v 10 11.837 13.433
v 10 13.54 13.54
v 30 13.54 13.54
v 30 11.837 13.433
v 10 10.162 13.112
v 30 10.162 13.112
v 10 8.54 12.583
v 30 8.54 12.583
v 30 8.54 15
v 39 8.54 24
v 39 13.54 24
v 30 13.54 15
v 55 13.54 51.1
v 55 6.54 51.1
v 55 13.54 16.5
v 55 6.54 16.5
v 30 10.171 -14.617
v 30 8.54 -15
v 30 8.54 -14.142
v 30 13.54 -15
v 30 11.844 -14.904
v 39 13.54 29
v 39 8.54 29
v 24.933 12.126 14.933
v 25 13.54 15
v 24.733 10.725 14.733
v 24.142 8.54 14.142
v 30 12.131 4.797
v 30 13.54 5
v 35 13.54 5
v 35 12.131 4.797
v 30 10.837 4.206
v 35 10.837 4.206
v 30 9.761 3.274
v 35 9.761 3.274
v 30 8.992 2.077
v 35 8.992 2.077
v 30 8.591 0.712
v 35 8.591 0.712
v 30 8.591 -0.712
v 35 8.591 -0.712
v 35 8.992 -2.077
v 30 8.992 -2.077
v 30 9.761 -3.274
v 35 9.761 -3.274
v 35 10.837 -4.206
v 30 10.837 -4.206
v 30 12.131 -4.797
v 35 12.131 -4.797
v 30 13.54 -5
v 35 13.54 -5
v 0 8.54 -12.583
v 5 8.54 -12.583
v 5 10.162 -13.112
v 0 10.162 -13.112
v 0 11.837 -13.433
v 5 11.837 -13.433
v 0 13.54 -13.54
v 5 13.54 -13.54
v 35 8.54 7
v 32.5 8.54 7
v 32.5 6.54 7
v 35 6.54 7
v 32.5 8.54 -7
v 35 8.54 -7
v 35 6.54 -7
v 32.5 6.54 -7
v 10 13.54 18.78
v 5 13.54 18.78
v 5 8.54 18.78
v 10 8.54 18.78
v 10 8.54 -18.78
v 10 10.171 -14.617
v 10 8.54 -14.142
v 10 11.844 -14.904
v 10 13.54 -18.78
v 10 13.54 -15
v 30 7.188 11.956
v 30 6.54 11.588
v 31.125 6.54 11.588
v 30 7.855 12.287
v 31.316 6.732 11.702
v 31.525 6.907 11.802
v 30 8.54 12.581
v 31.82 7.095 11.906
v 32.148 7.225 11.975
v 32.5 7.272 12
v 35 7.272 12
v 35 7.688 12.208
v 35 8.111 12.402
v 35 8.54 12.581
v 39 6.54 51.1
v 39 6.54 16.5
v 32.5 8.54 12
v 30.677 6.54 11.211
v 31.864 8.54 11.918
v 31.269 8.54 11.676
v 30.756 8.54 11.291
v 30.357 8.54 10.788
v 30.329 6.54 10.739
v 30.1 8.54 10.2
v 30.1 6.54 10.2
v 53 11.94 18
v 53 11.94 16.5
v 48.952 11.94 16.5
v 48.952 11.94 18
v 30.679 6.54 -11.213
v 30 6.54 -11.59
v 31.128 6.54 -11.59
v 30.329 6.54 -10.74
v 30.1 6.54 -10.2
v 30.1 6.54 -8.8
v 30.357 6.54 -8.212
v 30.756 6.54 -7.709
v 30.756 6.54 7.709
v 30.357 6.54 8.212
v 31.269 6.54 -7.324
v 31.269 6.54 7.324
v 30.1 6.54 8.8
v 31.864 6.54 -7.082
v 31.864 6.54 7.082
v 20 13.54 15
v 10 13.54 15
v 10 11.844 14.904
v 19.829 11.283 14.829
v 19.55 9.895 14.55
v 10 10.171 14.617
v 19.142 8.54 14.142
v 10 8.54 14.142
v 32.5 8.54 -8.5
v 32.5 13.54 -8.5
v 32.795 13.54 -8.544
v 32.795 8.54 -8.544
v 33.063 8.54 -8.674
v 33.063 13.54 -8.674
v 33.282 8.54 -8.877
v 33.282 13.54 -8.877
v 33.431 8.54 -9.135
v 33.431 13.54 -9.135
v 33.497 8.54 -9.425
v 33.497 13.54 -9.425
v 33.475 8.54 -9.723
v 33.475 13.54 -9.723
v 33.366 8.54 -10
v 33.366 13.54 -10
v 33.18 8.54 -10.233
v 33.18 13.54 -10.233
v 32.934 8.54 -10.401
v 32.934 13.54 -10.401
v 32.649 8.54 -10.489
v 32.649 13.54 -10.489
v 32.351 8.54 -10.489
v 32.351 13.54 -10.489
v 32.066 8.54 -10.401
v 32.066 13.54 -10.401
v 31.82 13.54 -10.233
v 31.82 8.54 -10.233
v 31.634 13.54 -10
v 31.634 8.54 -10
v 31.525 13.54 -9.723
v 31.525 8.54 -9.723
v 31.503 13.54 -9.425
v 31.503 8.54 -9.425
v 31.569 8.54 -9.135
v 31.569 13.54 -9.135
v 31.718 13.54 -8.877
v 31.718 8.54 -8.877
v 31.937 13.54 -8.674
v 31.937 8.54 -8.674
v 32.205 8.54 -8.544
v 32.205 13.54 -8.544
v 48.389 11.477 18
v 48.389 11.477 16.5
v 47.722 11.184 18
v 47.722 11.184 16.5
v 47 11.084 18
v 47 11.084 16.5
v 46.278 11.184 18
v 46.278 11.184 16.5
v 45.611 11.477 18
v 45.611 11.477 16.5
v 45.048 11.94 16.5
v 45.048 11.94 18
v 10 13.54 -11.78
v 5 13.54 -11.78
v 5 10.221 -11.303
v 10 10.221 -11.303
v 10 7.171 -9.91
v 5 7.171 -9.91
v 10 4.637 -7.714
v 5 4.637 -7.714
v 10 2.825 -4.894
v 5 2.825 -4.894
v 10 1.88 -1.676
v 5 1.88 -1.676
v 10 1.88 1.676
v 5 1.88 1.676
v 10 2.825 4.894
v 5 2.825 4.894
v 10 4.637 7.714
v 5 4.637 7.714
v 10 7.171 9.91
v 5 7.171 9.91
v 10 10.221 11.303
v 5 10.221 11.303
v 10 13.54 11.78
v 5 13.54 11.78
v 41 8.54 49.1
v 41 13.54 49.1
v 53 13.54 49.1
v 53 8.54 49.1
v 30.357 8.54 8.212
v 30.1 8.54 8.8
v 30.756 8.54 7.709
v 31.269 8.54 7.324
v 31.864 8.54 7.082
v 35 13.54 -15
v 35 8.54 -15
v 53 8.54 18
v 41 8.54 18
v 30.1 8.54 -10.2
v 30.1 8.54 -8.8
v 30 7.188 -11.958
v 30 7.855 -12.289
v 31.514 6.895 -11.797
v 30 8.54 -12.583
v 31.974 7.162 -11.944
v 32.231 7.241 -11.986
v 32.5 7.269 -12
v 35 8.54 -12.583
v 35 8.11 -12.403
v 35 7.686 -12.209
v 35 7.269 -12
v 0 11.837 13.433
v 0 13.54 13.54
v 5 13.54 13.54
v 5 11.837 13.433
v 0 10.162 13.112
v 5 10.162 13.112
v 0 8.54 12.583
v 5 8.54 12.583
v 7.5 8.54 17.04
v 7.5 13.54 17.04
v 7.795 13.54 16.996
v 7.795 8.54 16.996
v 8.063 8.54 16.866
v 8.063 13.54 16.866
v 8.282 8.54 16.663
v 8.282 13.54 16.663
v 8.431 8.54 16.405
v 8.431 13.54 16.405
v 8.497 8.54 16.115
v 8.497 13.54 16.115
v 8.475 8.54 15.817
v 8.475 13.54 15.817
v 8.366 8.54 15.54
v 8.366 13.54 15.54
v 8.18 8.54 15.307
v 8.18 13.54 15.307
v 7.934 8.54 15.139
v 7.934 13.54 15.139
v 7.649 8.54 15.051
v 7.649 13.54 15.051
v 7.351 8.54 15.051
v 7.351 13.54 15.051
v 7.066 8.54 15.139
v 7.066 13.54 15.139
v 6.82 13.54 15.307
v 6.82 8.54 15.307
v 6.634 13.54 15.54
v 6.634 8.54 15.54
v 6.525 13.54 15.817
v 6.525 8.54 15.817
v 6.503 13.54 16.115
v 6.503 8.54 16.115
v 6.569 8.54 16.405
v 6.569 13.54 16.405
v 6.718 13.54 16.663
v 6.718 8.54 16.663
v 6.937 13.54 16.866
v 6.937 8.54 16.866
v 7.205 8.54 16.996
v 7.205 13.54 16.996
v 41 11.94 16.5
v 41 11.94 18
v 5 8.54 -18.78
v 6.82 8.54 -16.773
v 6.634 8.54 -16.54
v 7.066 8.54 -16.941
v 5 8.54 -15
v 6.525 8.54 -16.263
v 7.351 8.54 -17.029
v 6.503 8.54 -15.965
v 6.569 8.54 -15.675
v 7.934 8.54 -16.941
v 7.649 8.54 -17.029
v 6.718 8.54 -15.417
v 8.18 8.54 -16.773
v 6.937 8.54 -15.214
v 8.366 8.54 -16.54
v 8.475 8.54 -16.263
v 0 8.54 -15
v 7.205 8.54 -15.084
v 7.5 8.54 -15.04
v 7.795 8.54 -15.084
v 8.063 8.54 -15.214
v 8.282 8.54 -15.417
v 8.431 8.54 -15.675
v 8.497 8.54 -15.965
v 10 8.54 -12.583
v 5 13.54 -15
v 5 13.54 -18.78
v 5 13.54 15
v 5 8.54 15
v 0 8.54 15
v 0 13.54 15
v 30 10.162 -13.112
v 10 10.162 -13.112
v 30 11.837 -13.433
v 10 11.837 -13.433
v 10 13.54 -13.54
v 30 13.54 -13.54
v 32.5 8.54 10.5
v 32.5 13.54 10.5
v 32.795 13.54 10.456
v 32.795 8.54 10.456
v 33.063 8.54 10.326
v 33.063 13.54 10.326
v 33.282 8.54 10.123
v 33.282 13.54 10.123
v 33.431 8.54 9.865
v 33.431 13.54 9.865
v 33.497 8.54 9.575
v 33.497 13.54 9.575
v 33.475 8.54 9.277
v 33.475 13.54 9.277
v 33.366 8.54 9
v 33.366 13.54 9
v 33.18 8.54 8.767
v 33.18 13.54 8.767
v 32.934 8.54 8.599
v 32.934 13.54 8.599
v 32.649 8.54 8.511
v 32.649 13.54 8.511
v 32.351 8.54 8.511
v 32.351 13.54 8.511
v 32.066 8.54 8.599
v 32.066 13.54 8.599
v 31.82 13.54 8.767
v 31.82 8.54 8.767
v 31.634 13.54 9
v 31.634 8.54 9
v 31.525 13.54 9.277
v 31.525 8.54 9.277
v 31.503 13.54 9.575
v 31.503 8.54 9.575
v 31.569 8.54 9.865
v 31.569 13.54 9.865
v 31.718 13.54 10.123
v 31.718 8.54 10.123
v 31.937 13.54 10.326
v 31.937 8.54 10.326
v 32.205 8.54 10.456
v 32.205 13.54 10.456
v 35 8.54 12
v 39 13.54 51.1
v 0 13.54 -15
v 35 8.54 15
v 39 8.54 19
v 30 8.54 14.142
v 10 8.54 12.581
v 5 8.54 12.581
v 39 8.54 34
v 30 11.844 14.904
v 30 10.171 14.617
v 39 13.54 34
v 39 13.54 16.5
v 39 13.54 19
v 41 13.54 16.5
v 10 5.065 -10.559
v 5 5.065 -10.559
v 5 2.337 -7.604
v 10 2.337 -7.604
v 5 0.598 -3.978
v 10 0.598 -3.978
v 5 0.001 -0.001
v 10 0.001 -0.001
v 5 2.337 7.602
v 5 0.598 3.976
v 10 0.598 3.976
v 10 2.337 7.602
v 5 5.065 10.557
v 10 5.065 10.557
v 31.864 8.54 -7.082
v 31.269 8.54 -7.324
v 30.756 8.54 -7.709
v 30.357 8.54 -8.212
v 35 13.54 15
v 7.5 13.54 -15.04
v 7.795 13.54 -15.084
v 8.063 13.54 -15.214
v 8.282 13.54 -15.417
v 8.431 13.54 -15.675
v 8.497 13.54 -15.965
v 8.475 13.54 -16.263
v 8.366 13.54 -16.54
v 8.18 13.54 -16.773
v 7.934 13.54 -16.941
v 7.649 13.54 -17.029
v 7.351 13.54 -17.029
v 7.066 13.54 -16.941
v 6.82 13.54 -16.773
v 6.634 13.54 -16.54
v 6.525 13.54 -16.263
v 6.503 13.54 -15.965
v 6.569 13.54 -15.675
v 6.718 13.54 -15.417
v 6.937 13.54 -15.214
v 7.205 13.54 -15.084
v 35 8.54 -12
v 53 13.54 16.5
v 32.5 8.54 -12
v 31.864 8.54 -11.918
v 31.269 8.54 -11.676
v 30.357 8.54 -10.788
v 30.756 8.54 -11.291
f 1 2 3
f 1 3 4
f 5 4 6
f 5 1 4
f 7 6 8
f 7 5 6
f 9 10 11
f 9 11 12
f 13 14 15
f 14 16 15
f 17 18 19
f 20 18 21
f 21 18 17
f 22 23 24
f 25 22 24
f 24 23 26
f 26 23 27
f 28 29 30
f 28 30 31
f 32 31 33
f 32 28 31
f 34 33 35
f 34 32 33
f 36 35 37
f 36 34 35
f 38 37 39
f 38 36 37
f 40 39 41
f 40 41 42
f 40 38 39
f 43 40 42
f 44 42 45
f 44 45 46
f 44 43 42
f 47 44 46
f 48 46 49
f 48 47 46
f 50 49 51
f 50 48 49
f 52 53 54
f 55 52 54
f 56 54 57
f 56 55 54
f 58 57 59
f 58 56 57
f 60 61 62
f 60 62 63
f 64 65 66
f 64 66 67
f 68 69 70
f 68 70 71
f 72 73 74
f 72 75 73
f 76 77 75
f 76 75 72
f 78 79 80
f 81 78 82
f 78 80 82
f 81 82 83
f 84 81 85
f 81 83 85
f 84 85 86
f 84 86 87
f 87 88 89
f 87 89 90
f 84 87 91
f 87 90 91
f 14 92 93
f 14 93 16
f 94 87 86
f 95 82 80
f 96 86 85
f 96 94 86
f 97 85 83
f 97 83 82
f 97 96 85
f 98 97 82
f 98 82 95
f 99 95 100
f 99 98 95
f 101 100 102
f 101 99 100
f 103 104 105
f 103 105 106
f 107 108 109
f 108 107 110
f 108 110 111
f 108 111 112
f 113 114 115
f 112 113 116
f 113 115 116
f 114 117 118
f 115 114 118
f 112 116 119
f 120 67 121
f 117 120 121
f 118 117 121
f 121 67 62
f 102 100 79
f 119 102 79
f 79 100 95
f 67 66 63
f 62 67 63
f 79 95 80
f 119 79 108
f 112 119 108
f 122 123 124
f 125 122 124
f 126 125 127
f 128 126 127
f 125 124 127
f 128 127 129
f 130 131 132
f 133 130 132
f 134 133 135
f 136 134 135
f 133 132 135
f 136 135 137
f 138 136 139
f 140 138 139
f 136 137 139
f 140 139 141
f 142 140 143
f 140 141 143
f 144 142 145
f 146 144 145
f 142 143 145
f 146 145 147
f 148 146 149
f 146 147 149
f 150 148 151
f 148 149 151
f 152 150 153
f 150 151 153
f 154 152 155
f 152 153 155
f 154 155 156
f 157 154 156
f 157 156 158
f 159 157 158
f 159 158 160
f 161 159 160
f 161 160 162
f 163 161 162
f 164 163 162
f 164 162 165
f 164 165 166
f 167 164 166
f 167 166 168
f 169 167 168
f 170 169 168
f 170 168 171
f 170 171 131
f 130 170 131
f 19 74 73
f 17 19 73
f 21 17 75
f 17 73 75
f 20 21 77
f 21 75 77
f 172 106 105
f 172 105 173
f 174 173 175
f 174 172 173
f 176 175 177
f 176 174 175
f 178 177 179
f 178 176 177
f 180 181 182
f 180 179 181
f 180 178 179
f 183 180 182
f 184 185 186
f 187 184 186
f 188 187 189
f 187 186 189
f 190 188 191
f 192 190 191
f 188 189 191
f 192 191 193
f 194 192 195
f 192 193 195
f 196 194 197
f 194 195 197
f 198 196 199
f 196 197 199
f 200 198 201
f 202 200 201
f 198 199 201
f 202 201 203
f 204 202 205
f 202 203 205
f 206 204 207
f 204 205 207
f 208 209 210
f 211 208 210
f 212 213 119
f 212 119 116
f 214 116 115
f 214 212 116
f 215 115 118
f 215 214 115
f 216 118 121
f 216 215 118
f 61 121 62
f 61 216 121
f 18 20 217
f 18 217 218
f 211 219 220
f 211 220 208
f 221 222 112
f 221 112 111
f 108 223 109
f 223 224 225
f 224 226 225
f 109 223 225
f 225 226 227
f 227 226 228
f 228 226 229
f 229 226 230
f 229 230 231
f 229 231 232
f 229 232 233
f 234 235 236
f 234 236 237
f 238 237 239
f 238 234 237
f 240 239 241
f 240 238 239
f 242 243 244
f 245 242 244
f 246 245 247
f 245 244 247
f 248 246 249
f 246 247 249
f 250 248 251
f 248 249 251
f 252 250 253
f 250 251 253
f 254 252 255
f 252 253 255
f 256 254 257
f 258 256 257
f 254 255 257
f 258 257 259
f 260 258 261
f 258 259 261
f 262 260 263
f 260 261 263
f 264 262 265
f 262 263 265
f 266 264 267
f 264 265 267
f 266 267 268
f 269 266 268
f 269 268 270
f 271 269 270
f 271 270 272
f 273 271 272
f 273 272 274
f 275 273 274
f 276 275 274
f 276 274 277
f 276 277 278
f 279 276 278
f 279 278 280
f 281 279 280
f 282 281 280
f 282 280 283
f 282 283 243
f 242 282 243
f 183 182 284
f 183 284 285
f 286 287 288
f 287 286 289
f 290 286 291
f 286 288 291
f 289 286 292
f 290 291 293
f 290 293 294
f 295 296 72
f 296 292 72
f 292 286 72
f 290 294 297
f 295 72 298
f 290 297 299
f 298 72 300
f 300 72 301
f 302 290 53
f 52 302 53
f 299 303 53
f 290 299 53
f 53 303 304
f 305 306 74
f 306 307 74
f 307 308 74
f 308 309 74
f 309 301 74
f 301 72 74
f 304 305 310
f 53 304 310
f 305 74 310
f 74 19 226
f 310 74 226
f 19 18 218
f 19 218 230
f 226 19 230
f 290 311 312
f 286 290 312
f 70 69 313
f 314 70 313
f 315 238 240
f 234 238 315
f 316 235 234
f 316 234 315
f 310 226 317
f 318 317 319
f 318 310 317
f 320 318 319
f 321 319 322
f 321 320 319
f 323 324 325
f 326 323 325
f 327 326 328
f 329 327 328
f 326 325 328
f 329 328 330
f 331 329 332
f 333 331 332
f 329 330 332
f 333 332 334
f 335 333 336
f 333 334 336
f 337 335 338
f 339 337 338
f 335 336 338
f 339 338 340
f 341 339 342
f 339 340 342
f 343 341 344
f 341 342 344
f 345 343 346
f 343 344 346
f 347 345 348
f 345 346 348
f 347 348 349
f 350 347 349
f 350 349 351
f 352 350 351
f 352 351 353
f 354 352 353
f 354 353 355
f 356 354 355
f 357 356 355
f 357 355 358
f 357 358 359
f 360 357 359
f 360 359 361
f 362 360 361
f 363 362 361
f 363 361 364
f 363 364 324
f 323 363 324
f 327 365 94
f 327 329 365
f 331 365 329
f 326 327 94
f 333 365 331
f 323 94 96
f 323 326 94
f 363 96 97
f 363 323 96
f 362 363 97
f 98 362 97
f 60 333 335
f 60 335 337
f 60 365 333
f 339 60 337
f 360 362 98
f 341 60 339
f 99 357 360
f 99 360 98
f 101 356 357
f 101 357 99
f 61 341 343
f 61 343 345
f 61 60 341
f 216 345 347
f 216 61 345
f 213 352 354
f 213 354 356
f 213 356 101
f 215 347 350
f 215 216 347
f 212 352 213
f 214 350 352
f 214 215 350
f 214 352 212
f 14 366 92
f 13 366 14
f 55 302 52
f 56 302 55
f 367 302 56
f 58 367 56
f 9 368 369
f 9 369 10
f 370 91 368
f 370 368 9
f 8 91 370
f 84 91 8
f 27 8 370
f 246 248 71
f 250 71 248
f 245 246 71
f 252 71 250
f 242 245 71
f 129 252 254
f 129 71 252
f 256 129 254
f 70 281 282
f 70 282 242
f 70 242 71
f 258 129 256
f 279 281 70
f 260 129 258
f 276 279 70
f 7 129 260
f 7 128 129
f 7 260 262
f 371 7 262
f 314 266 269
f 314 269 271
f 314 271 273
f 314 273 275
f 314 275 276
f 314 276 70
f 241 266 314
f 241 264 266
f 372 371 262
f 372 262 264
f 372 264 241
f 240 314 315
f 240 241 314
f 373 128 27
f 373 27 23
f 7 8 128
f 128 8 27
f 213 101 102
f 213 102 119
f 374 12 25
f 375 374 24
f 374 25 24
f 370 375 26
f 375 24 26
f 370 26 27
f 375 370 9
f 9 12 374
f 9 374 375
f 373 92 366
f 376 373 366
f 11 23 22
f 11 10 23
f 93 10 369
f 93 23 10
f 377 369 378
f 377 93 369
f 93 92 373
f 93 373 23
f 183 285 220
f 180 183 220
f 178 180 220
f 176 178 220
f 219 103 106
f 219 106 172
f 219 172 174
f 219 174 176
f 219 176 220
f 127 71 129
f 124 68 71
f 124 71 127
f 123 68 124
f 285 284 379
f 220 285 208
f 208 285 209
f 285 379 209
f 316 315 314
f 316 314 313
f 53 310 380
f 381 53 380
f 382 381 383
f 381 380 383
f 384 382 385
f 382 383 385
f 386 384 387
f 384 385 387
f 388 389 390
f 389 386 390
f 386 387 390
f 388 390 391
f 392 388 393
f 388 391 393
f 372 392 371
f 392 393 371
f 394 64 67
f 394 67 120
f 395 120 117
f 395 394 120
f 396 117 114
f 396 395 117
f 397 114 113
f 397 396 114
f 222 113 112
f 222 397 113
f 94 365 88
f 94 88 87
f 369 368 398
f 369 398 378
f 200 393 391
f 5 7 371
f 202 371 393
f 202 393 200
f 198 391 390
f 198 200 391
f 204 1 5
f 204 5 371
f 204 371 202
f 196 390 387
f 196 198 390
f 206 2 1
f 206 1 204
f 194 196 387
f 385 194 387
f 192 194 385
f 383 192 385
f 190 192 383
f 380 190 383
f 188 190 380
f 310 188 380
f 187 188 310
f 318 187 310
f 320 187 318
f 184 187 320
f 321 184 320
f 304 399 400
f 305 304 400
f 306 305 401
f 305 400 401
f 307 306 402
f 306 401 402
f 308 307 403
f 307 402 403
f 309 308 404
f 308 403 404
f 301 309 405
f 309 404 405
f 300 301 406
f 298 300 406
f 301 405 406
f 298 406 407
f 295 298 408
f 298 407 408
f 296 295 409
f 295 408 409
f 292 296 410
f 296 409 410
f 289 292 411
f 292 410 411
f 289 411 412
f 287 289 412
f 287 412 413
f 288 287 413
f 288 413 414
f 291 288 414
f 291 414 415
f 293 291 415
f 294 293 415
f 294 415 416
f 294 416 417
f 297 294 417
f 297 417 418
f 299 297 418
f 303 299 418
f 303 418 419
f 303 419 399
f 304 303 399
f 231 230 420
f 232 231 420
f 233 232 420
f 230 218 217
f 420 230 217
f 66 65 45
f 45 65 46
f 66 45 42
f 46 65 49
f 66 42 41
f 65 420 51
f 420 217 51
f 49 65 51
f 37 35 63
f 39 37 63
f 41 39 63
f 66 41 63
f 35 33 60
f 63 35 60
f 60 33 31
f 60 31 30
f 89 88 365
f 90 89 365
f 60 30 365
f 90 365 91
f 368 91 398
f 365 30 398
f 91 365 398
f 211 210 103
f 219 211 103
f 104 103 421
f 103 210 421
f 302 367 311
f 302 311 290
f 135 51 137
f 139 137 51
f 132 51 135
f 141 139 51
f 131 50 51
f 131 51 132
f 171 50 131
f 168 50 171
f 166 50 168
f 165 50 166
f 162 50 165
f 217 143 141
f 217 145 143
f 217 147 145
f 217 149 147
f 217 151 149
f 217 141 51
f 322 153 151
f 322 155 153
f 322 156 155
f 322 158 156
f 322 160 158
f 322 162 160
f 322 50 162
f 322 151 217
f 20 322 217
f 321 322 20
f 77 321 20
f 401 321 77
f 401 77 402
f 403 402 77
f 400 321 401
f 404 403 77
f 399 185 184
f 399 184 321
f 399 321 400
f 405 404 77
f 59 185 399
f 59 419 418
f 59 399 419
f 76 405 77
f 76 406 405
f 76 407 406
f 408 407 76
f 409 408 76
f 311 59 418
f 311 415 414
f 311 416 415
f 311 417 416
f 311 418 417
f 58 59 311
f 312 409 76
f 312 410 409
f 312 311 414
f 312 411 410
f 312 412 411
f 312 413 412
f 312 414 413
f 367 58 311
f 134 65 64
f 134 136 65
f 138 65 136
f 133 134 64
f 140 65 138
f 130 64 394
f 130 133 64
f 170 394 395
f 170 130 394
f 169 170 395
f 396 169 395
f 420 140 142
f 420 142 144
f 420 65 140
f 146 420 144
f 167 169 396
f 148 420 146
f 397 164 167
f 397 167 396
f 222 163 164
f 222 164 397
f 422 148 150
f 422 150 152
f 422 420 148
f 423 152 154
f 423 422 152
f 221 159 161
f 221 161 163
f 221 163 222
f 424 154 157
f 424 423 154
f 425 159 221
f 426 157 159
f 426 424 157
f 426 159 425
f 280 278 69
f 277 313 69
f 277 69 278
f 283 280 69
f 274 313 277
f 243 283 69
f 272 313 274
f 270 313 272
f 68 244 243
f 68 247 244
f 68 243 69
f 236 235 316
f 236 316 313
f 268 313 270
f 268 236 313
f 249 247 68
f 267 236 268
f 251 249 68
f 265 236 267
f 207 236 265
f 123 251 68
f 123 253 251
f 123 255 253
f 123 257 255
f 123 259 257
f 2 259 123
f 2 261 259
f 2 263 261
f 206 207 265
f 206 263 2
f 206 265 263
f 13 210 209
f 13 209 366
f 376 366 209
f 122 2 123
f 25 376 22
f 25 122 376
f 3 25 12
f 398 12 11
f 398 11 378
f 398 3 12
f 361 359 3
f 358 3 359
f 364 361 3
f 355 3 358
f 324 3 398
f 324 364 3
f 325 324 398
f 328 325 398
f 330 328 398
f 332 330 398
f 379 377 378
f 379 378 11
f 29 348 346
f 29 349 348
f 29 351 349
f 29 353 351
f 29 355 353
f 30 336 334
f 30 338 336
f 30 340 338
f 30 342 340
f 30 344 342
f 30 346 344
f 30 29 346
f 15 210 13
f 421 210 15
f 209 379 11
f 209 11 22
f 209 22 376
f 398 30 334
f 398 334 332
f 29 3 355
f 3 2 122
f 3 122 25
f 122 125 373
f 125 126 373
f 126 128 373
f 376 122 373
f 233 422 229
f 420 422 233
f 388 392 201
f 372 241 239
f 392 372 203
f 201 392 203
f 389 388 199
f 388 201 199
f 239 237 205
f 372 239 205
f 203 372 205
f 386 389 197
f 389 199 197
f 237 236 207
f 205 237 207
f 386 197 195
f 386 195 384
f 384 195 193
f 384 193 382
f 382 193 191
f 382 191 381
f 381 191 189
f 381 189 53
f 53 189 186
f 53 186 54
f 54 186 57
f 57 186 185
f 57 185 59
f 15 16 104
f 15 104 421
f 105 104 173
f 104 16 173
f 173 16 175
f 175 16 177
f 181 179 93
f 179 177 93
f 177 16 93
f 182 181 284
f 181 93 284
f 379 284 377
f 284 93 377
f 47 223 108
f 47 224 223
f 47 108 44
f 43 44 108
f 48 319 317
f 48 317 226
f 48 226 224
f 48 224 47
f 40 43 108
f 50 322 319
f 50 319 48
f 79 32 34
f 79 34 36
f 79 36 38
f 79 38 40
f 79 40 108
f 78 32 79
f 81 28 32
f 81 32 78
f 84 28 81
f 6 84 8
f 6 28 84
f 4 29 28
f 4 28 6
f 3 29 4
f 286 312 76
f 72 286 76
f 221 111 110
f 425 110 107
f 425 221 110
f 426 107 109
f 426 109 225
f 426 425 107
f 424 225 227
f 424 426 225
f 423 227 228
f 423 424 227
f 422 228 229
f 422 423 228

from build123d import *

# Parameters (mm, degrees)
BOSS_EXTRUDE1_DEPTH     = 35
BOSS_EXTRUDE2_START     = -5
BOSS_EXTRUDE2_DEPTH     = 5
BOSS_EXTRUDE3_START     = -5
BOSS_EXTRUDE3_DEPTH     = 5
CUT_EXTRUDE1_DEPTH      = 31.1
SKETCH10_W              = 5
SKETCH10_H              = 3.78
BOSS_EXTRUDE6_DEPTH     = 5
CUT_EXTRUDE4_START      = -10
CUT_EXTRUDE4_DEPTH      = 20
SKETCH12_R              = 1
CUT_EXTRUDE5_DEPTH      = 10
CUT_EXTRUDE11_DEPTH     = 2
SKETCH14_R              = 2.5
CUT_EXTRUDE12_DEPTH     = 2
BOSS_EXTRUDE7_START     = -2
SKETCH15_R              = 2
BOSS_EXTRUDE7_DEPTH     = 5
BOSS_EXTRUDE8_DEPTH     = 6
SKETCH18_W              = 32.6
SKETCH18_H              = 12
BOSS_EXTRUDE9_DEPTH     = 2
SKETCH19_W              = 32.6
SKETCH19_H              = 12
BOSS_EXTRUDE10_DEPTH    = 2
CUT_EXTRUDE13_DEPTH     = 64.083608013
BOSS_EXTRUDE12_START    = -5
BOSS_EXTRUDE12_DEPTH    = 5
SKETCH22_W              = 16
SKETCH22_H              = 32.6
CUT_EXTRUDE14_DEPTH     = 5
SKETCH23_R              = 2
CUT_EXTRUDE15_DEPTH     = 5
SKETCH24_W              = 23.178287832
SKETCH24_H              = 10
CUT_EXTRUDE_THIN1_DEPTH = 5
CUT_EXTRUDE16_DEPTH     = 5
SKETCH26_W              = 16
SKETCH26_H              = 7
BOSS_EXTRUDE13_DEPTH    = 2


with BuildPart() as part:
    # Sketch2 → Boss-Extrude1 (new body)
    with BuildSketch(Plane(origin=(0, 0, 0), x_dir=(0, 0, -1), z_dir=(1, 0, 0))):
        with BuildLine():
            Line((-15, 13.54), (-13.54, 13.54))
            ThreePointArc((-13.54, 13.54), (0, 0), (13.54, 13.54))
            Line((13.54, 13.54), (15, 13.54))
            Line((15, 13.54), (15, -1.46))
            Line((15, -1.46), (0, -1.46))
            Line((0, -1.46), (-15, -1.46))
            Line((-15, -1.46), (-15, 13.54))
        make_face()
    extrude(amount=BOSS_EXTRUDE1_DEPTH)

    # Sketch3 → Boss-Extrude2 (add)
    with BuildSketch(Plane(origin=(35, 0, 0), x_dir=(0, 0, -1), z_dir=(1, 0, 0)).offset(BOSS_EXTRUDE2_START)):
        with BuildLine():
            Line((-13.54, 13.54), (-5, 13.54))
            ThreePointArc((-5, 13.54), (0, 8.54), (5, 13.54))
            Line((5, 13.54), (13.54, 13.54))
            ThreePointArc((13.54, 13.54), (0, 0), (-13.54, 13.54))
        make_face()
    extrude(amount=BOSS_EXTRUDE2_DEPTH)

    # Sketch4 → Boss-Extrude3 (add)
    with BuildSketch(Plane.ZY.offset(BOSS_EXTRUDE3_START)):
        with BuildLine():
            Line((-13.54, 13.54), (-11.78, 13.54))
            ThreePointArc((-11.78, 13.54), (0, 1.76), (11.78, 13.54))
            Line((11.78, 13.54), (13.54, 13.54))
            ThreePointArc((13.54, 13.54), (0, 0), (-13.54, 13.54))
        make_face()
    extrude(amount=-BOSS_EXTRUDE3_DEPTH)

    # Sketch7 → Cut-Extrude1 (cut)
    with BuildSketch(Plane(origin=(0, 0, -15), x_dir=(-1, 0, 0), z_dir=(0, 0, -1))):
        with BuildLine():
            Line((-33.5, -1.74), (-39.5, -1.74))
            Line((-39.5, -1.74), (-39.5, 4.26))
            ThreePointArc((-39.5, 4.26), (-35.257359313, 2.502640687), (-33.5, -1.74))
        make_face()
    extrude(amount=-CUT_EXTRUDE1_DEPTH, mode=Mode.SUBTRACT)

    # Sketch10 → Boss-Extrude6 (add)
    with BuildSketch(Plane(origin=(0, 13.54, 0), x_dir=(1, 0, 0), z_dir=(0, 1, 0))):
        with Locations((7.5, -16.89)):
            Rectangle(SKETCH10_W, SKETCH10_H)
        with Locations((7.5, 16.89)):
            Rectangle(SKETCH10_W, SKETCH10_H)
    extrude(amount=-BOSS_EXTRUDE6_DEPTH)

    # Sketch11 → Cut-Extrude4 (cut)
    with BuildSketch(Plane.ZY.offset(CUT_EXTRUDE4_START)):
        with BuildLine():
            ThreePointArc((15, 13.54), (10.606601722, 2.933398287), (1.2e-08, -1.46))
            Line((1.2e-08, -1.46), (15, -1.46))
            Line((15, -1.46), (15, 13.54))
        make_face()
        with BuildLine():
            ThreePointArc((1.2e-08, -1.46), (-10.606601713, 2.933398278), (-15, 13.54))
            Line((-15, 13.54), (-15, -1.46))
            Line((-15, -1.46), (1.2e-08, -1.46))
        make_face()
    extrude(amount=-CUT_EXTRUDE4_DEPTH, mode=Mode.SUBTRACT)

    # Sketch12 → Cut-Extrude5 (cut)
    with BuildSketch(Plane(origin=(0, 13.54, 0), x_dir=(1, 0, 0), z_dir=(0, 1, 0))):
        with Locations(Location((7.5, -16.04, 0), (0, 0, 270))):
            Circle(SKETCH12_R)
        with Locations(Location((7.5, 16.04, 0), (0, 0, 270))):
            Circle(SKETCH12_R)
        with Locations(Location((32.5, -9.5, 0), (0, 0, 270))):
            Circle(SKETCH12_R)
        with Locations(Location((32.5, 9.5, 0), (0, 0, 270))):
            Circle(SKETCH12_R)
    extrude(amount=-CUT_EXTRUDE5_DEPTH, mode=Mode.SUBTRACT)

    # Sketch13 → Cut-Extrude11 (cut)
    with BuildSketch(Plane(origin=(0, 8.54, 0), x_dir=(1, 0, 0), z_dir=(0, 1, 0))):
        with BuildLine():
            Line((32.5, 12), (35, 12))
            Line((35, 12), (35.753860742, 12))
            Line((35.753860742, 12), (35.753860742, 7))
            Line((35.753860742, 7), (35, 7))
            Line((35, 7), (32.5, 7))
            ThreePointArc((32.5, 7), (31, 7.5), (30.1, 8.8))
            Line((30.1, 8.8), (30.1, 9.5))
            Line((30.1, 9.5), (30.1, 10.2))
            ThreePointArc((30.1, 10.2), (31, 11.5), (32.5, 12))
        make_face()
        with BuildLine():
            Line((32.5, -7), (35, -7))
            Line((35, -7), (35.753860742, -7))
            Line((35.753860742, -7), (35.753860742, -12))
            Line((35.753860742, -12), (32.5, -12))
            ThreePointArc((32.5, -12), (31, -11.5), (30.1, -10.2))
            Line((30.1, -10.2), (30.1, -9.5))
            Line((30.1, -9.5), (30.1, -8.8))
            ThreePointArc((30.1, -8.8), (31, -7.5), (32.5, -7))
        make_face()
    extrude(amount=-CUT_EXTRUDE11_DEPTH, mode=Mode.SUBTRACT)

    # Sketch14 → Cut-Extrude12 (cut)
    with BuildSketch(Plane.XZ.offset(-8.54)):
        with Locations((7.5, 16.04)):
            Circle(SKETCH14_R)
        with Locations((7.5, -16.04)):
            Circle(SKETCH14_R)
    extrude(amount=CUT_EXTRUDE12_DEPTH, mode=Mode.SUBTRACT)

    # Sketch20 → Cut-Extrude13 (cut, through all)
    with BuildSketch(Plane(origin=(35, 0, 0), x_dir=(0, 0, -1), z_dir=(1, 0, 0))):
        with BuildLine():
            Line((15, 8.54), (12.582988516, 8.54))
            ThreePointArc((12.582988516, 8.54), (0.000990149, 0.000672008), (-12.581008218, 8.54))
            Line((-12.581008218, 8.54), (-15, 8.54))
            Line((-15, 8.54), (-15, -1.46))
            Line((-15, -1.46), (15, -1.46))
            Line((15, -1.46), (15, 8.54))
        make_face()
    extrude(amount=-CUT_EXTRUDE13_DEPTH, mode=Mode.SUBTRACT)



with BuildPart() as body_2:
    # Sketch15 → Boss-Extrude7 (new body)
    with BuildSketch(Plane(origin=(0, 0, 0), x_dir=(-1, 0, 0), z_dir=(0, 0, -1)).offset(BOSS_EXTRUDE7_START)):
        with Locations((-47.000109969, 13.54)):
            Circle(SKETCH15_R)
    extrude(amount=-BOSS_EXTRUDE7_DEPTH)

    # Sketch23 → Cut-Extrude15 (cut)
    with BuildSketch(Plane(origin=(0, 0, 2), x_dir=(-1, 0, 0), z_dir=(0, 0, -1))):
        with Locations((-47.000109969, 13.54)):
            Circle(SKETCH23_R)
    extrude(amount=-CUT_EXTRUDE15_DEPTH, mode=Mode.SUBTRACT)


with BuildPart() as body_3:
    # Sketch16 → Boss-Extrude8 (new, symmetric)
    with BuildSketch(Plane(origin=(47, 0, 0), x_dir=(0, 0, -1), z_dir=(1, 0, 0))):
        Polygon((-18, 11.94), (-18, 8.54), (-49.1, 8.54), (-49.1, 6.54), (-16.5, 6.54), (-16.5, 11.94), align=None)
    extrude(amount=BOSS_EXTRUDE8_DEPTH, both=True)

    # Sketch18 → Boss-Extrude9 (add)
    with BuildSketch(Plane.ZY.offset(-41)):
        with Locations((32.8, 12.54)):
            Rectangle(SKETCH18_W, SKETCH18_H)
    extrude(amount=BOSS_EXTRUDE9_DEPTH)

    # Sketch19 → Boss-Extrude10 (add)
    with BuildSketch(Plane(origin=(53, 0, 0), x_dir=(0, 0, -1), z_dir=(1, 0, 0))):
        with Locations((-32.8, 12.54)):
            Rectangle(SKETCH19_W, SKETCH19_H)
    extrude(amount=BOSS_EXTRUDE10_DEPTH)


with BuildPart() as part_1:
    add(part.part)

    add(body_3.part)  # Boss-Extrude12 merges body 3
    # Sketch21 → Boss-Extrude12 (add)
    with BuildSketch(Plane(origin=(0, 13.54, 0), x_dir=(1, 0, 0), z_dir=(0, 1, 0)).offset(BOSS_EXTRUDE12_START)):
        Polygon((35, -15), (39, -19), (39, -24), (30, -15), align=None)
        Polygon((25, -15), (39, -29), (39, -34), (20, -15), (19.142135624, -14.142135624), (24.142135624, -14.142135624), align=None)
    extrude(amount=BOSS_EXTRUDE12_DEPTH)

    # Sketch22 → Cut-Extrude14 (cut)
    with BuildSketch(Plane(origin=(0, 13.54, 0), x_dir=(1, 0, 0), z_dir=(0, 1, 0))):
        with Locations((47, -32.8)):
            Rectangle(SKETCH22_W, SKETCH22_H)
    extrude(amount=CUT_EXTRUDE14_DEPTH, mode=Mode.SUBTRACT)

    # Sketch24 → Cut-Extrude-Thin1 (cut)
    with BuildSketch(Plane(origin=(35, 0, 0), x_dir=(0, 0, -1), z_dir=(1, 0, 0))):
        with Locations((0.000990149, 1.54)):
            Rectangle(SKETCH24_W, SKETCH24_H)
        with BuildLine():
            ThreePointArc((-11.587661518, 6.54), (0, 0.002130911), (11.587661518, 6.54))
            Line((11.587661518, 6.54), (20.14710425, 1.369319183))
            ThreePointArc((20.14710425, 1.369319183), (0, -9.997869089), (-20.14710425, 1.369319183))
            Line((-20.14710425, 1.369319183), (-11.587661518, 6.54))
        make_face()
    extrude(amount=-CUT_EXTRUDE_THIN1_DEPTH, mode=Mode.SUBTRACT)

    # Sketch25 → Cut-Extrude16 (cut)
    with BuildSketch(Plane.XY.offset(18)):
        with BuildLine():
            Line((45.047915657, 11.94), (48.952084343, 11.94))
            ThreePointArc((48.952084343, 11.94), (47, 11.083618243), (45.047915657, 11.94))
        make_face()
    extrude(amount=-CUT_EXTRUDE16_DEPTH, mode=Mode.SUBTRACT)

    # Sketch26 → Boss-Extrude13 (add)
    with BuildSketch(Plane.XY.offset(49.1)):
        with Locations((47, 10.04)):
            Rectangle(SKETCH26_W, SKETCH26_H)
    extrude(amount=BOSS_EXTRUDE13_DEPTH)


solid = part_1.part
